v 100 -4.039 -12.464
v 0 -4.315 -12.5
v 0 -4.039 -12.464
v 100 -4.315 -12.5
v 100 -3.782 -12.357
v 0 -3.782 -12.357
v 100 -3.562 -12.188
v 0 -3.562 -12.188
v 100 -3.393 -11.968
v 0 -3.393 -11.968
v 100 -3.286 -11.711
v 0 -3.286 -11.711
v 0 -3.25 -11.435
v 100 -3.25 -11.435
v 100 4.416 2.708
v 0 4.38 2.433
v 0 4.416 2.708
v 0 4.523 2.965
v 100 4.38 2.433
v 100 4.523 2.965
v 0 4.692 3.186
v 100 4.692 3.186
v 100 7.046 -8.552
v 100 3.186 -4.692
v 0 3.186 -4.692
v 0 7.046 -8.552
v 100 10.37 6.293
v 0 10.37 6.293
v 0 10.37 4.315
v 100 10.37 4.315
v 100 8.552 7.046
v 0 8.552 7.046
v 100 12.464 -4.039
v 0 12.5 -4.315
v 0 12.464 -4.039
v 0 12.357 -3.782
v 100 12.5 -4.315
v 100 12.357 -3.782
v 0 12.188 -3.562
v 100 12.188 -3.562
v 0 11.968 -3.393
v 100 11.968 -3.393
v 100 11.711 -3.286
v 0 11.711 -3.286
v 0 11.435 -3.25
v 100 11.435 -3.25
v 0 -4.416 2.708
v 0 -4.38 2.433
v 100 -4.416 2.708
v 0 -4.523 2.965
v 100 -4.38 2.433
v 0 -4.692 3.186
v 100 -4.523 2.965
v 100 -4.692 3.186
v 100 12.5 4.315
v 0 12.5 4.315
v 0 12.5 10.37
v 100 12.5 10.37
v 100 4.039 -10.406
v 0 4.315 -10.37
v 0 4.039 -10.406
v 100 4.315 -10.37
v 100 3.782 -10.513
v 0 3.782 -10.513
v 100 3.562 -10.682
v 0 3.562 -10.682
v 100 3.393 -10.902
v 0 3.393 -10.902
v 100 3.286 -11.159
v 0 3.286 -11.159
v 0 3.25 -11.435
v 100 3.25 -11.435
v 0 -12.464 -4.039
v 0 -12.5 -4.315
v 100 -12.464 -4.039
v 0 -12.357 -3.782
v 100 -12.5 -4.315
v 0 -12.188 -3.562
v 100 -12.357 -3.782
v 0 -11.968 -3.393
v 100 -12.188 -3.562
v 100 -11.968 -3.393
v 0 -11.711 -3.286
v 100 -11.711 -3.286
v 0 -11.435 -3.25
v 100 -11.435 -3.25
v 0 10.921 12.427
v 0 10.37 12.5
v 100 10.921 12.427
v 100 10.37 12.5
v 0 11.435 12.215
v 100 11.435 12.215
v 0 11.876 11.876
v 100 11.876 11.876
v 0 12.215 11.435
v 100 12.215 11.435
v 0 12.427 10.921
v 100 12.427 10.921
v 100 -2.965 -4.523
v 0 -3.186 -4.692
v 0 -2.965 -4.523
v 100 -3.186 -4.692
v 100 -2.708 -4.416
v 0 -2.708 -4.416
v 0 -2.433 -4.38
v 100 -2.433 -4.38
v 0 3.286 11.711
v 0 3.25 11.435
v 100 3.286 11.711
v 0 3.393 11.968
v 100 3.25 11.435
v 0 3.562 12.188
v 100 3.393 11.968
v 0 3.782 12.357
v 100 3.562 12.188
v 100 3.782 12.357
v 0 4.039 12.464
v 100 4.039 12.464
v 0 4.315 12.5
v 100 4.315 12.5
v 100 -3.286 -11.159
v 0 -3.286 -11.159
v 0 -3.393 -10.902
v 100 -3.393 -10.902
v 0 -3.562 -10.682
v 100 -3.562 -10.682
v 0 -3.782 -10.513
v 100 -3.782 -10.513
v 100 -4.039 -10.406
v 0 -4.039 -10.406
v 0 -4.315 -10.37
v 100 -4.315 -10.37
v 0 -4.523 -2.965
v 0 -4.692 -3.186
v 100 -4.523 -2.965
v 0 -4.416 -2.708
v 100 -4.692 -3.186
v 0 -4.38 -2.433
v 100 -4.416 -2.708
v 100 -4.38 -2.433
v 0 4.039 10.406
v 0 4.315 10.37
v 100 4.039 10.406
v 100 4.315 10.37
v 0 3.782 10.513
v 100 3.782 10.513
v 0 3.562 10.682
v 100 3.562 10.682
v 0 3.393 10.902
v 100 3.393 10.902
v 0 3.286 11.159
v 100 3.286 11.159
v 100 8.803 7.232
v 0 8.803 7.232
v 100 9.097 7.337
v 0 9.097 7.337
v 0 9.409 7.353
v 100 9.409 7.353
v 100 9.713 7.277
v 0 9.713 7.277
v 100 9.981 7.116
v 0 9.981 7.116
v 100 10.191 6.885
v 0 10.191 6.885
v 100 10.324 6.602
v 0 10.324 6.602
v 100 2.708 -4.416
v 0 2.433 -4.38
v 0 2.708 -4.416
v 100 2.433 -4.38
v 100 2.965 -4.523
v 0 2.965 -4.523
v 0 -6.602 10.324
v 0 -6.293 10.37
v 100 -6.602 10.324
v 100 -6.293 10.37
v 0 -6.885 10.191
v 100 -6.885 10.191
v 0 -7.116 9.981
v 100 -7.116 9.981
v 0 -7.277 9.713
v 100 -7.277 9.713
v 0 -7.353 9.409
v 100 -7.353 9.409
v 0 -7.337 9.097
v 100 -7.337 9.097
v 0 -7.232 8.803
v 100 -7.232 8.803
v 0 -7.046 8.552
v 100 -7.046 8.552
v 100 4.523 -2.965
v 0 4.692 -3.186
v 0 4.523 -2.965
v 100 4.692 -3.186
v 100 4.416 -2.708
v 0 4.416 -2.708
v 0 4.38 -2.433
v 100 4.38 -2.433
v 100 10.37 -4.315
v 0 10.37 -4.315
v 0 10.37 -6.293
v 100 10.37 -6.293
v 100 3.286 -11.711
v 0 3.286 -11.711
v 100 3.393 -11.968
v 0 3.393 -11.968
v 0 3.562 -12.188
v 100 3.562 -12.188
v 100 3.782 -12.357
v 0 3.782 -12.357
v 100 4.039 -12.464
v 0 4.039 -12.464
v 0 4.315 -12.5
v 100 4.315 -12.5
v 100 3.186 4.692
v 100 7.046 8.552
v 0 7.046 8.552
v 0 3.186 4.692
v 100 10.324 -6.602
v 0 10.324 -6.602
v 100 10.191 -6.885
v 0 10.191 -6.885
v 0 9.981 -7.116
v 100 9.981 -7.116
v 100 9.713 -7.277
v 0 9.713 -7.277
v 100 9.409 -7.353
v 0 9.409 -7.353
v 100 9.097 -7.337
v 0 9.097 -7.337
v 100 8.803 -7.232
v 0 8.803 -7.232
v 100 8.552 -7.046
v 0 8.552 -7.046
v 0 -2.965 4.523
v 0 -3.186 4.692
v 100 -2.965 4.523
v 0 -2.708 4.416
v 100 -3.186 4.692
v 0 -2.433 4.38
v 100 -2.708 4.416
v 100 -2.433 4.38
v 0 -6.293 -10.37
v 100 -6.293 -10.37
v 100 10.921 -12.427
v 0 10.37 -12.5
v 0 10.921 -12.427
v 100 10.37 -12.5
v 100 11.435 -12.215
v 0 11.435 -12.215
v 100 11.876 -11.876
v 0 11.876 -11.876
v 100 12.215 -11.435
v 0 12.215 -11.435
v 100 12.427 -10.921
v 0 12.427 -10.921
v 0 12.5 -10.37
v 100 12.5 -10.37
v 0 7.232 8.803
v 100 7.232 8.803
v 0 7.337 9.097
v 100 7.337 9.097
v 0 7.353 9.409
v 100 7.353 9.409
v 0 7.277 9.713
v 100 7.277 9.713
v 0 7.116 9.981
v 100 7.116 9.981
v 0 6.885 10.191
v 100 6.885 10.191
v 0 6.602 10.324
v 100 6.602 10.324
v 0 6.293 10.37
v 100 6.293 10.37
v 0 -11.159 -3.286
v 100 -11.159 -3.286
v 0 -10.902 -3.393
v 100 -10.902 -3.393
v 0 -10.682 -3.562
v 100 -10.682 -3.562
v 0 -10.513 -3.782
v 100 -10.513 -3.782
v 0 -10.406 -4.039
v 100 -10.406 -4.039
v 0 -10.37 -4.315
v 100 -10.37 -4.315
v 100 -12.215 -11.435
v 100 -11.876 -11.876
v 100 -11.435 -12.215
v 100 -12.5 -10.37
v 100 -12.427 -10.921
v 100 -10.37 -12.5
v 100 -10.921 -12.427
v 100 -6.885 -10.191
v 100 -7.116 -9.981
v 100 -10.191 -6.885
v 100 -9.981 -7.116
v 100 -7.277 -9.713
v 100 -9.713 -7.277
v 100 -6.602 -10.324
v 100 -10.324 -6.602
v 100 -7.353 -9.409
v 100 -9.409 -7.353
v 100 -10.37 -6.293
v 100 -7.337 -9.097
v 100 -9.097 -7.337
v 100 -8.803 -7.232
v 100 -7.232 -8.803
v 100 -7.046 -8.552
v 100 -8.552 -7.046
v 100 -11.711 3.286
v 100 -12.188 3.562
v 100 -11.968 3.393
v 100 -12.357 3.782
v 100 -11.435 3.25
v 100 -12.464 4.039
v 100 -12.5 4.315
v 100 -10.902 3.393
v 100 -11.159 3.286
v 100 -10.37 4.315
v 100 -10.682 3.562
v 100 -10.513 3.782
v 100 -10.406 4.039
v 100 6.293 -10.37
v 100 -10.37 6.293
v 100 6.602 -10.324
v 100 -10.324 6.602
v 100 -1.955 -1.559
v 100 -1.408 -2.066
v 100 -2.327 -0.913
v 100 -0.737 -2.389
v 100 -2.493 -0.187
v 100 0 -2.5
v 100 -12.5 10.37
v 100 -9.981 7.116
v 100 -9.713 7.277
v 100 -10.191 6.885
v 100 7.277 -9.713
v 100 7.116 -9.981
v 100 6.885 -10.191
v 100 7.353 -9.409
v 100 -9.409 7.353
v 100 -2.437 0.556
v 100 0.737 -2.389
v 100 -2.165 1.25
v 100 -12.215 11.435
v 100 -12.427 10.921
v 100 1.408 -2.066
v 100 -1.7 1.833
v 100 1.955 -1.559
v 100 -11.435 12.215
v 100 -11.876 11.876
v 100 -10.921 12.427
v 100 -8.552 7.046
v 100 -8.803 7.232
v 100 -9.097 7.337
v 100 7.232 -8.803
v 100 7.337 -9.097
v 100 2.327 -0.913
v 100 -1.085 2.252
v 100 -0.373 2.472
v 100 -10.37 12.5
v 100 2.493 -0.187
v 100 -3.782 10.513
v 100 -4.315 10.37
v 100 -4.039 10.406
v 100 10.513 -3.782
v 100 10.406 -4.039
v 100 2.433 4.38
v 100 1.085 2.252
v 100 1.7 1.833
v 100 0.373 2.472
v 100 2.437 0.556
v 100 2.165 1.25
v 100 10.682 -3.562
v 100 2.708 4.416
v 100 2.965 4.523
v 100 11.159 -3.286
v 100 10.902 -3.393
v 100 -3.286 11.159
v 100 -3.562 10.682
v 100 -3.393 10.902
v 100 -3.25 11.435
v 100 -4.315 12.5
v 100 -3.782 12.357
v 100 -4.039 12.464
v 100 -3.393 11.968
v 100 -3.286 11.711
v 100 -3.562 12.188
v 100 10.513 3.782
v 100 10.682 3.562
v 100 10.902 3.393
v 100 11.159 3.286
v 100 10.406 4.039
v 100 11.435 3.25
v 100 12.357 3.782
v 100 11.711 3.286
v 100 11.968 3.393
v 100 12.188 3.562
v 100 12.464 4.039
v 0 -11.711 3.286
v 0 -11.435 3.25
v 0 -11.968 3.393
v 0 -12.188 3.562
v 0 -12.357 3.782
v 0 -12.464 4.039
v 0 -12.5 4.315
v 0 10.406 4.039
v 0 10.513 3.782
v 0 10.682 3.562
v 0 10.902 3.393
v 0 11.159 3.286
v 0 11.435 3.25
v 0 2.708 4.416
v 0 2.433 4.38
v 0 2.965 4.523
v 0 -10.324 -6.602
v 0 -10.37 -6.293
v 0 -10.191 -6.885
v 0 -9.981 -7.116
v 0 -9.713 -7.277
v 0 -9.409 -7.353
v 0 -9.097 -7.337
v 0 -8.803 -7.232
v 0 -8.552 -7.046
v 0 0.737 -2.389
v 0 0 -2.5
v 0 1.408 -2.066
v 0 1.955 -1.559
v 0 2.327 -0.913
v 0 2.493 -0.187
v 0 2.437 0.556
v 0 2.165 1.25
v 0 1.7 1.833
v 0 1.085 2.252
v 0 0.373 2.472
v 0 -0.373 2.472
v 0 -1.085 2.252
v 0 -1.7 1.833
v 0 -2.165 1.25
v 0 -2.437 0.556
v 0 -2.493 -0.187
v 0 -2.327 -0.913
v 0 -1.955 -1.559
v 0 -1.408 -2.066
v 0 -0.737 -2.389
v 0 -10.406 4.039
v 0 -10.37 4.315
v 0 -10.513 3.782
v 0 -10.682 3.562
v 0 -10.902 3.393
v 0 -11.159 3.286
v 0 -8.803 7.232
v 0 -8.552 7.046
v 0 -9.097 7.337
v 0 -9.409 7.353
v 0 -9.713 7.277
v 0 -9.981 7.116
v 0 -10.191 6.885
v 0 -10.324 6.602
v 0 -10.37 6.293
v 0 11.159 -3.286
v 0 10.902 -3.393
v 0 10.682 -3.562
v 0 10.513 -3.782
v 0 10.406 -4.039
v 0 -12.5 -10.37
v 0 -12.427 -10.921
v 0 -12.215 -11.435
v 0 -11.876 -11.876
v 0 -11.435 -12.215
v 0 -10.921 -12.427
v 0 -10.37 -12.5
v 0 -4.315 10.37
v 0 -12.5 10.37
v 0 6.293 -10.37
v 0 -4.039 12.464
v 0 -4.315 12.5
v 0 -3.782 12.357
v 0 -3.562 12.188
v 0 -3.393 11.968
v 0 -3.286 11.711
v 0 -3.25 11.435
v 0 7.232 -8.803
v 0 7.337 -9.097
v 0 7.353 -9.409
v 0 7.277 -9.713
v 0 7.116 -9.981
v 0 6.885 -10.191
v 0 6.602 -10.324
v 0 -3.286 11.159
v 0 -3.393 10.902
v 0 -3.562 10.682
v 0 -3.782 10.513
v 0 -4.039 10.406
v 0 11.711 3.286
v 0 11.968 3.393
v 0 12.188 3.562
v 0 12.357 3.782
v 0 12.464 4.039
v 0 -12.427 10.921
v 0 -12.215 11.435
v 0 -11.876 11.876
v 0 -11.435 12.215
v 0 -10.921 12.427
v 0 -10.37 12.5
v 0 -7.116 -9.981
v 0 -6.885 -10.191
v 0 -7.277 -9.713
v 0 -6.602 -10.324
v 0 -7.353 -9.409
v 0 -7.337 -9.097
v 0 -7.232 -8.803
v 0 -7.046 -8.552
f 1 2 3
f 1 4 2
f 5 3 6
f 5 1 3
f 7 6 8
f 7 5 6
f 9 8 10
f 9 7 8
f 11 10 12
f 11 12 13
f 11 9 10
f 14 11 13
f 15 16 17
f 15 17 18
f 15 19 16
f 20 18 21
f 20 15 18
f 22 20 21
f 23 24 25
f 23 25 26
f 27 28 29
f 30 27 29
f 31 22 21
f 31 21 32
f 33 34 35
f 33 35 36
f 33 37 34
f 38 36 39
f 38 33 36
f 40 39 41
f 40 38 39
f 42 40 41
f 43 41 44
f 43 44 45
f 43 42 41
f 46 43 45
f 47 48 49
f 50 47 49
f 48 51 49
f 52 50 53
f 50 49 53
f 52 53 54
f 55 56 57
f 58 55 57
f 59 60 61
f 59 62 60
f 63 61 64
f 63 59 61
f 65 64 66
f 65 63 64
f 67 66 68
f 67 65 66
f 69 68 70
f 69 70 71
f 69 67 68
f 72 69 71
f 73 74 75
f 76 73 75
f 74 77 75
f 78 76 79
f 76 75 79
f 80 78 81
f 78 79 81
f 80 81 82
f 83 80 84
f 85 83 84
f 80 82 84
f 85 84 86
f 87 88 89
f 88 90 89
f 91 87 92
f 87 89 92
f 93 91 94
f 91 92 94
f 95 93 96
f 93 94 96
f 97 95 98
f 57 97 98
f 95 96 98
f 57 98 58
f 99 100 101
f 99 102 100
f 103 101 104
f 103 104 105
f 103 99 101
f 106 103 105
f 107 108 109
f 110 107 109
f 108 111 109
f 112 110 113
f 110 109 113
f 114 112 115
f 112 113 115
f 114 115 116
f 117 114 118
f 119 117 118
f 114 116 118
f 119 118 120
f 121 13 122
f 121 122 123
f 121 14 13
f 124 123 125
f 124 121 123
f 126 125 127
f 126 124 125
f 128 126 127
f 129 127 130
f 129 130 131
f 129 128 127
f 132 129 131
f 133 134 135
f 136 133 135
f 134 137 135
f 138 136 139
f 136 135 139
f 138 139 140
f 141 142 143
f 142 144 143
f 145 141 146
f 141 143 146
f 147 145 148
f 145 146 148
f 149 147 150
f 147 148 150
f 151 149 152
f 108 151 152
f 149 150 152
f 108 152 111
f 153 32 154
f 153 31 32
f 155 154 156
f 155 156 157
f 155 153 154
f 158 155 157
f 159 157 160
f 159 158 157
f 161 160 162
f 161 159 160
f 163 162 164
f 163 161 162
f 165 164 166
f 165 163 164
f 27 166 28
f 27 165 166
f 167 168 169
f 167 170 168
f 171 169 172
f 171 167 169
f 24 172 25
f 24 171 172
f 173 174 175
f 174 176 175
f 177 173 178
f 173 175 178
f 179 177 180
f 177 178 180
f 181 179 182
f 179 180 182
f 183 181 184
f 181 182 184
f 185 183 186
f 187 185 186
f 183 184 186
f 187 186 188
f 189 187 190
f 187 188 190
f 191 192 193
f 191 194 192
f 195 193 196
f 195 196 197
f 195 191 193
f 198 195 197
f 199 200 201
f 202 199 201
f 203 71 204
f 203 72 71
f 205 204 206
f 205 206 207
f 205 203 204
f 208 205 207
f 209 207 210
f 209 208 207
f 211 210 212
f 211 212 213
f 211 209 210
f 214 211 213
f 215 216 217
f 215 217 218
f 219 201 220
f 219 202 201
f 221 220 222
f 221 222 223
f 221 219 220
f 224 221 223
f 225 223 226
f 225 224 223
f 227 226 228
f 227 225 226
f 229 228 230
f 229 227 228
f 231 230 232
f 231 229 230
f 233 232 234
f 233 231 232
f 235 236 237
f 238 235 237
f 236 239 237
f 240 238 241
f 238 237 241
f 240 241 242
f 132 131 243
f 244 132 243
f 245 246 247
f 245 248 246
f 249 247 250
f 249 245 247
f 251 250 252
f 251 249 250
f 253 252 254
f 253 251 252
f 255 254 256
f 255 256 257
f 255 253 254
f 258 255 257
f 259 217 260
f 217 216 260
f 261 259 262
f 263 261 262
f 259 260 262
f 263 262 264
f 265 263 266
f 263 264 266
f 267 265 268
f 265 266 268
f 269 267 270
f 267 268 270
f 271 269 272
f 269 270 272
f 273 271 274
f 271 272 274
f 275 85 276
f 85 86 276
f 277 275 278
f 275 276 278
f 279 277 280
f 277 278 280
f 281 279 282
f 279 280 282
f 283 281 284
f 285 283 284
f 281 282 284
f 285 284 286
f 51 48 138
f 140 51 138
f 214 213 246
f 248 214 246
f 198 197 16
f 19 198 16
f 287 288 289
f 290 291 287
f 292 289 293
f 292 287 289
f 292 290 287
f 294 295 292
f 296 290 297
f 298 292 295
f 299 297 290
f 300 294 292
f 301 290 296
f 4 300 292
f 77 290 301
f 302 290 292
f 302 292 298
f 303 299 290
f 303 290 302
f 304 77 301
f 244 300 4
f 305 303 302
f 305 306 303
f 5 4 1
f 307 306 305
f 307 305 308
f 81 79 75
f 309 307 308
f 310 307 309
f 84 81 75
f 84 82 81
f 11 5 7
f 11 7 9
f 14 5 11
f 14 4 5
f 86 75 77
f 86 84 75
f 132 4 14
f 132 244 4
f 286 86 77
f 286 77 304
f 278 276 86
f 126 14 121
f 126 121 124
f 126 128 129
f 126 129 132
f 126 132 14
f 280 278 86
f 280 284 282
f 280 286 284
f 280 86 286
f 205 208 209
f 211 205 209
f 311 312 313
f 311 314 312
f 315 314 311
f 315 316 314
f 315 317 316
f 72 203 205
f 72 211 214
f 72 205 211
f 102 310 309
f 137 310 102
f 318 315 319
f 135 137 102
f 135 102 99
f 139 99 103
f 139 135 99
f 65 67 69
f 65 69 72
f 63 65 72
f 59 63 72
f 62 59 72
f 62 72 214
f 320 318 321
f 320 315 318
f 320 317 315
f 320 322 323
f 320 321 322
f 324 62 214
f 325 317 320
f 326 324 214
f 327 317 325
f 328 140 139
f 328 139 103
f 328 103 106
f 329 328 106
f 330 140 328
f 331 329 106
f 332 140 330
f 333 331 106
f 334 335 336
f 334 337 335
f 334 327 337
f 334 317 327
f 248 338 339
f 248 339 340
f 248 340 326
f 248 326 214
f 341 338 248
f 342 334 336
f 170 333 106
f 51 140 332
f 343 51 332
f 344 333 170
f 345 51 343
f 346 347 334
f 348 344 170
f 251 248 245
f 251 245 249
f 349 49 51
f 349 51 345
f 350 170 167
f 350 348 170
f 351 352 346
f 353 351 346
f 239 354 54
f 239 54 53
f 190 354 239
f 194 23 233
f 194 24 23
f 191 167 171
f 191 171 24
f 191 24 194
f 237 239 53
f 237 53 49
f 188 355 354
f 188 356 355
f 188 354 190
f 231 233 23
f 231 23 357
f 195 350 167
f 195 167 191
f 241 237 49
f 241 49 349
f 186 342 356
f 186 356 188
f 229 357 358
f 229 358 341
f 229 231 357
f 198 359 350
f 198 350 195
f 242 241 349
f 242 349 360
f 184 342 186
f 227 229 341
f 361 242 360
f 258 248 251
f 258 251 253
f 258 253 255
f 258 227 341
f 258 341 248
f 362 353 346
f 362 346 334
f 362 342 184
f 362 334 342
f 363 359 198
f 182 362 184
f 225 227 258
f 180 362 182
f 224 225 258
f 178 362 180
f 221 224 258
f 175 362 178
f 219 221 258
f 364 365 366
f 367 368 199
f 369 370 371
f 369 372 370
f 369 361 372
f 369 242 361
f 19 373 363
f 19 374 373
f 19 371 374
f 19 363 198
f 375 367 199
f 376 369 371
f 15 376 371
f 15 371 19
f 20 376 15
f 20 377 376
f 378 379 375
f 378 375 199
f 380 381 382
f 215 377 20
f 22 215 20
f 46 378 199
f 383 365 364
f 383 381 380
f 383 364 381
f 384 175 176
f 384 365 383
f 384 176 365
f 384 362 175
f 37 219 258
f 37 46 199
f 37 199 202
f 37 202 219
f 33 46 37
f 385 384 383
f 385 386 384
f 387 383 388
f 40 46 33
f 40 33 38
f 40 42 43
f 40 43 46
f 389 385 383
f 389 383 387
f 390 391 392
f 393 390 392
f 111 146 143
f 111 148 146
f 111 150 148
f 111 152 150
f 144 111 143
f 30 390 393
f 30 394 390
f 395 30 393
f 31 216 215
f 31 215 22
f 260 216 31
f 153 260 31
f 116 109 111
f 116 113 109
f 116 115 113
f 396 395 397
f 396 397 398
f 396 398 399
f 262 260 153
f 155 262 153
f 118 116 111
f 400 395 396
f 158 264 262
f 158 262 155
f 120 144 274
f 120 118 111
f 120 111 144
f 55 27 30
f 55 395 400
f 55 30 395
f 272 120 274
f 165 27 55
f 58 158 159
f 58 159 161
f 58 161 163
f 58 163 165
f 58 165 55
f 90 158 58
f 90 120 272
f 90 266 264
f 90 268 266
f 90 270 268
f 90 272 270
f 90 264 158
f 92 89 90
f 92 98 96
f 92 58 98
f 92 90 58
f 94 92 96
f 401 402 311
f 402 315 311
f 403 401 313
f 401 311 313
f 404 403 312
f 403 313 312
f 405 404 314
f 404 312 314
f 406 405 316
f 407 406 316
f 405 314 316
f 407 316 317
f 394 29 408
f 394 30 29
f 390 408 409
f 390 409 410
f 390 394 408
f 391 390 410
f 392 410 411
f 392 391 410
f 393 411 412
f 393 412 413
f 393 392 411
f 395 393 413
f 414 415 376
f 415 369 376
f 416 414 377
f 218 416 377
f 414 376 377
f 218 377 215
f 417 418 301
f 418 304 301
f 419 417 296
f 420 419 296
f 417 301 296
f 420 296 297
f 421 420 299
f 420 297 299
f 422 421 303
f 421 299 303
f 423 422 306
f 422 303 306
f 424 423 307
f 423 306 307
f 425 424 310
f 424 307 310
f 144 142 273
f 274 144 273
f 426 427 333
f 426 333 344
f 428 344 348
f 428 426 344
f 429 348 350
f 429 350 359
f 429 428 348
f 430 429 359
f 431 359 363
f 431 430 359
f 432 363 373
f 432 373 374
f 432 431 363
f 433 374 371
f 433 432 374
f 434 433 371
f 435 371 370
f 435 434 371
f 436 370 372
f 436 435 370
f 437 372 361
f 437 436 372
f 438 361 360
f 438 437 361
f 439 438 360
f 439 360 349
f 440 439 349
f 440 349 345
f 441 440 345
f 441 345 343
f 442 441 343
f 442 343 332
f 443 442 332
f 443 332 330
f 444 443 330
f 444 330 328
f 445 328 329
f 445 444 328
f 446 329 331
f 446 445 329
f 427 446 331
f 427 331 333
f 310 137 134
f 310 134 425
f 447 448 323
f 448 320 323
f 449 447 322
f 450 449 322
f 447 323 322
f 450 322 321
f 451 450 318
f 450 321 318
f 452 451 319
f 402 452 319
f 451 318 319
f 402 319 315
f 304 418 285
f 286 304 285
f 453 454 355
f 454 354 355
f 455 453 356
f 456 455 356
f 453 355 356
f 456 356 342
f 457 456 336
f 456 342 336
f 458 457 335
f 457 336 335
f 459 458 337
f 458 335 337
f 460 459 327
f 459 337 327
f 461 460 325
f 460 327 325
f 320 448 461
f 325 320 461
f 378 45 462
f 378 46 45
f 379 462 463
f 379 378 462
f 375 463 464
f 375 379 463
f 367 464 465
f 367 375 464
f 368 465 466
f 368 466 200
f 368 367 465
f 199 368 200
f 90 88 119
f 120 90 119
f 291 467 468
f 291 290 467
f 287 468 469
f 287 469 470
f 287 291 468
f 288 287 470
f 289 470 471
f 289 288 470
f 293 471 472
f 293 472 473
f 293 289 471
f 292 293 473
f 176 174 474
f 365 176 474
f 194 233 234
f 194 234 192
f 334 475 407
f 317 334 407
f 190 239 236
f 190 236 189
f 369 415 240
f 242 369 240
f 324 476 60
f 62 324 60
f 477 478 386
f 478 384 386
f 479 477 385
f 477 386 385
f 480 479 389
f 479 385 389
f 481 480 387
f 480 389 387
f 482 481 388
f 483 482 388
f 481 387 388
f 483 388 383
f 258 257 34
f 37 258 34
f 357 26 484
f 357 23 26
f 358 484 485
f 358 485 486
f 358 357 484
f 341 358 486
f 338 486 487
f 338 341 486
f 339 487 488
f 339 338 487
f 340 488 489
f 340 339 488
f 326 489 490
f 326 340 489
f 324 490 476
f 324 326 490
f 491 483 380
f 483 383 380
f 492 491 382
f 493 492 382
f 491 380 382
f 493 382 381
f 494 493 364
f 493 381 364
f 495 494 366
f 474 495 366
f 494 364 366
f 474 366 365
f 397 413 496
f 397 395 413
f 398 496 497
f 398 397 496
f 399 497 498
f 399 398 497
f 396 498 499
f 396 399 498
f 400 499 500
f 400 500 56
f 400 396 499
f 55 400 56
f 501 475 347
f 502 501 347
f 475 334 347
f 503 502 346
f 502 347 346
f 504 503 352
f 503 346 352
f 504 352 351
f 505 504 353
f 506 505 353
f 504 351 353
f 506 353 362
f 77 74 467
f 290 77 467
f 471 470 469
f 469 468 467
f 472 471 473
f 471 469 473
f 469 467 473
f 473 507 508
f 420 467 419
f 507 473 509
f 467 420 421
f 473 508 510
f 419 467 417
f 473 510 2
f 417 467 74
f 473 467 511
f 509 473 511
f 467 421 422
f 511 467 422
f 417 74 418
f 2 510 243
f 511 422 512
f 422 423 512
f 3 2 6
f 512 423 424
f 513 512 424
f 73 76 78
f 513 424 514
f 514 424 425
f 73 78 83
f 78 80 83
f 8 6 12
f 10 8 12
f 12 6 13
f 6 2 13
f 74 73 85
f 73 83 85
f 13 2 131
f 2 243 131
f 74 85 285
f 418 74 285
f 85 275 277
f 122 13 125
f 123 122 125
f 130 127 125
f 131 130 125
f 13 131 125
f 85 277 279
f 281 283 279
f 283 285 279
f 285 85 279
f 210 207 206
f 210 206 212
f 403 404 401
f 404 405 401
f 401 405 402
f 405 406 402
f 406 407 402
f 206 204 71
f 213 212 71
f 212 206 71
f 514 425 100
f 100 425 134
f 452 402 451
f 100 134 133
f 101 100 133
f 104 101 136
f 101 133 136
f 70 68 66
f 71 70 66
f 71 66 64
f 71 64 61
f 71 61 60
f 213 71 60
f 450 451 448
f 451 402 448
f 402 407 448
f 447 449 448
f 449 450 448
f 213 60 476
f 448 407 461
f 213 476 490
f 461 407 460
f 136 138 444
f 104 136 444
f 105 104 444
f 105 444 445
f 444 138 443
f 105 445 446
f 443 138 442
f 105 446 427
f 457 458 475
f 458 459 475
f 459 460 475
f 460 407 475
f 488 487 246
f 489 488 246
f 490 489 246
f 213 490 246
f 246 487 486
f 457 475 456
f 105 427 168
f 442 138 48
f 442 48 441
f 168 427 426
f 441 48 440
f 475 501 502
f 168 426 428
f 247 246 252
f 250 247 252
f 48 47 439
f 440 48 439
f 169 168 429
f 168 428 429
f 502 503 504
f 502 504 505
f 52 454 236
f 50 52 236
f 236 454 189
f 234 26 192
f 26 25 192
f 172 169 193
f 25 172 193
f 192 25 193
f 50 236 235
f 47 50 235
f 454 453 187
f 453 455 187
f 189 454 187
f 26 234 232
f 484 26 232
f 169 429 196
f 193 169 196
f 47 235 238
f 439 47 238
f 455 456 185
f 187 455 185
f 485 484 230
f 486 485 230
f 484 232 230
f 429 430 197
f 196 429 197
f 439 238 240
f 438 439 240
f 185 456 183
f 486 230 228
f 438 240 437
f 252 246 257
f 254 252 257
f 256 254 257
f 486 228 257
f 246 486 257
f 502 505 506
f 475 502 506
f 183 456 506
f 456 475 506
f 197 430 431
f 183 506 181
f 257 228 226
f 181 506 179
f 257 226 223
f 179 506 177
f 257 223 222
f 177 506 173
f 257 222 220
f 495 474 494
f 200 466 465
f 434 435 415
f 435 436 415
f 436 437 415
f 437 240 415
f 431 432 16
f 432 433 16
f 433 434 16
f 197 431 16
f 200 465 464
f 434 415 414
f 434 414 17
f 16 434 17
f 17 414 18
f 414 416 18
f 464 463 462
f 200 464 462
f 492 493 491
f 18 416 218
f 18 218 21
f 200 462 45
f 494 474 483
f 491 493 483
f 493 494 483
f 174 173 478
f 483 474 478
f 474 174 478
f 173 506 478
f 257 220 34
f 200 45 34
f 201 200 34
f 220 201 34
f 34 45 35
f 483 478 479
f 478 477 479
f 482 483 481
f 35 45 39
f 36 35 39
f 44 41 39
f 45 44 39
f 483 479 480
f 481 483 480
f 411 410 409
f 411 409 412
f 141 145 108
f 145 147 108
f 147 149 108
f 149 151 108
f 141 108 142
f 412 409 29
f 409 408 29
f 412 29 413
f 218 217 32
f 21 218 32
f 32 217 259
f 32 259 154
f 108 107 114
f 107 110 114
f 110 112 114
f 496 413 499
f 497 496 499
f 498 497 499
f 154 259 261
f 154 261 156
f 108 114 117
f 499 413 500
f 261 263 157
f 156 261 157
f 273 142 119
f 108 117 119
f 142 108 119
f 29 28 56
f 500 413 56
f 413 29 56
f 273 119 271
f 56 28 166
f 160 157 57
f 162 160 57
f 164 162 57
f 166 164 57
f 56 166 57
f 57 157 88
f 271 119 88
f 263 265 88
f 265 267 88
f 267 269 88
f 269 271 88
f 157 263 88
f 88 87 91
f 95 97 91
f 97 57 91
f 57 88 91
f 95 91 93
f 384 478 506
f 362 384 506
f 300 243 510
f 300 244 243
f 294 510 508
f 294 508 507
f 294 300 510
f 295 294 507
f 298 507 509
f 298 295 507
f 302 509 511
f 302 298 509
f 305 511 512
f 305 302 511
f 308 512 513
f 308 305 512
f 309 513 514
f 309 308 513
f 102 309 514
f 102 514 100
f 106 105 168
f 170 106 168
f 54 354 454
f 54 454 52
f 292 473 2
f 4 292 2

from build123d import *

# Parameters (mm, degrees)
SKETCH1_R           = 2.5
BOSS_EXTRUDE1_DEPTH = 100
FILLET1_R           = 1.065
FILLET2_R           = 2.13


with BuildPart() as part:
    # Sketch1 → Boss-Extrude1 (new body)
    with BuildSketch(Plane.YZ):
        Polygon((-12.5, -3.25), (-12.5, -12.5), (-3.25, -12.5), (-3.25, -10.37), (-8.863862556, -10.37), (-2.873862556, -4.38), (2.873862556, -4.38), (8.863862556, -10.37), (3.25, -10.37), (3.25, -12.5), (12.5, -12.5), (12.5, -3.25), (10.37, -3.25), (10.37, -8.863862556), (4.38, -2.873862556), (4.38, 2.873862556), (10.37, 8.863862556), (10.37, 3.25), (12.5, 3.25), (12.5, 12.5), (3.25, 12.5), (3.25, 10.37), (8.863862556, 10.37), (2.873862556, 4.38), (-2.873862556, 4.38), (-8.863862556, 10.37), (-3.25, 10.37), (-3.25, 12.5), (-12.5, 12.5), (-12.5, 3.25), (-10.37, 3.25), (-10.37, 8.863862556), (-4.38, 2.873862556), (-4.38, -2.873862556), (-10.37, -8.863862556), (-10.37, -3.25), align=None)
        with Locations(Location((0, 0, 0), (0, 0, 270))):
            Circle(SKETCH1_R, mode=Mode.SUBTRACT)
    extrude(amount=BOSS_EXTRUDE1_DEPTH)

    # Fillet1
    fillet1_edges = [part.edges().sort_by_distance(p)[0] for p in [
        (50, -10.37, -8.863862556),
        (50, 2.873862556, -4.38),
        (50, -2.873862556, -4.38),
        (50, -4.38, 2.873862556),
        (50, -4.38, -2.873862556),
        (50, -2.873862556, 4.38),
        (50, 2.873862556, 4.38),
        (50, 4.38, 2.873862556),
        (50, 4.38, -2.873862556),
        (50, -8.863862556, -10.37),
        (50, 8.863862556, -10.37),
        (50, 10.37, -8.863862556),
        (50, -10.37, 8.863862556),
        (50, -8.863862556, 10.37),
        (50, 10.37, 8.863862556),
        (50, 8.863862556, 10.37),
        (50, 12.5, 3.25),
        (50, -3.25, -12.5),
        (50, -10.37, 3.25),
        (50, 10.37, 3.25),
        (50, -10.37, -3.25),
        (50, -12.5, -3.25),
        (50, -12.5, 3.25),
        (50, 3.25, -10.37),
        (50, -3.25, -10.37),
        (50, 3.25, -12.5),
        (50, 10.37, -3.25),
        (50, 12.5, -3.25),
        (50, 3.25, 12.5),
        (50, 3.25, 10.37),
        (50, -3.25, 10.37),
        (50, -3.25, 12.5),
    ]]
    fillet(fillet1_edges, radius=FILLET1_R - 0.0001)  # a hair under: the kernel refuses the full size

    # Fillet2
    fillet2_edges = [part.edges().sort_by_distance(p)[0] for p in [
        (50, -12.5, 12.5),
        (50, 12.5, 12.5),
        (50, 12.5, -12.5),
        (50, -12.5, -12.5),
    ]]
    fillet(fillet2_edges, radius=FILLET2_R)


solid = part.part
